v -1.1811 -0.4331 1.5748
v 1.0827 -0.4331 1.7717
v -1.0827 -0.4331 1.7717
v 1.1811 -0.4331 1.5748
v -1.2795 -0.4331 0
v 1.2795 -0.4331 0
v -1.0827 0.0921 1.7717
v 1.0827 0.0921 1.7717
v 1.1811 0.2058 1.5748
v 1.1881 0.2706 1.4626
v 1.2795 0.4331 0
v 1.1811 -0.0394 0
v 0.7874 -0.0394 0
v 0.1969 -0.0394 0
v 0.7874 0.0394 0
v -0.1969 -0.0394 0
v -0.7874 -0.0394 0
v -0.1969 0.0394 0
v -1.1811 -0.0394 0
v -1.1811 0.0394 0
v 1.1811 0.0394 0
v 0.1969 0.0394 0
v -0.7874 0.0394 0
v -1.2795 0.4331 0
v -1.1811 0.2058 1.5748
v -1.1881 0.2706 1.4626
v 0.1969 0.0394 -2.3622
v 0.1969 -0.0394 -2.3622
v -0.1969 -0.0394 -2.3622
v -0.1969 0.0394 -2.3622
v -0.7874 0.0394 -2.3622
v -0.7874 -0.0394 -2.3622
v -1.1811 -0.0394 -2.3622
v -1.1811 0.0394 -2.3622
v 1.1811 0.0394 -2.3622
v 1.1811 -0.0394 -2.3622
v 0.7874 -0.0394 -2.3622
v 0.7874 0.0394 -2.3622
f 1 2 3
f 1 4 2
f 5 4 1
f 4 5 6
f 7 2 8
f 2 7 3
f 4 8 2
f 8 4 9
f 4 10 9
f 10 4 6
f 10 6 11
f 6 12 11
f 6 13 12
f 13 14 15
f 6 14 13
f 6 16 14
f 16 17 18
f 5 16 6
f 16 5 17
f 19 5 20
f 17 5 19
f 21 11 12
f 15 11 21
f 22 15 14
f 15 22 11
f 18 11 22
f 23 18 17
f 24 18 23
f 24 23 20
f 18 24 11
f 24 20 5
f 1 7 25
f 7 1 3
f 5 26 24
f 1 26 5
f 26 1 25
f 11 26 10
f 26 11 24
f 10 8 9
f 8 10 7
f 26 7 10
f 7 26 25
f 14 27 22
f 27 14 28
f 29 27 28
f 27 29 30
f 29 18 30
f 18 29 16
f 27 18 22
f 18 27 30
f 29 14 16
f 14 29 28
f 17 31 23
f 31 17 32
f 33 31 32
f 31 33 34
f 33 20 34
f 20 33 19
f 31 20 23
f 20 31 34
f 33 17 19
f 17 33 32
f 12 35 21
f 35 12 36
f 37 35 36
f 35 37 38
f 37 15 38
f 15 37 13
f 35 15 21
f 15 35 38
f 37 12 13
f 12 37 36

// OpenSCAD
$fs = 0.1;

module pin() {
	w = 1;
	d = 0.2;
	h = 6;
	color("silver")
	translate([-w/2, -d/2, -h])
	cube([w, d, h]);
}

module transistor() {
	_inch = 1 / 2.54;
	w1 = 6.5;
	w2 = 6;
	w3 = 5.5;
	d1 = 2.2;
	d2 = 2;
	h = 4.5;
	h1 = 4;
	h2 = 4.5;
	scale([_inch, _inch, _inch]) {
		color("red")
		translate([0, d1/2, 0])
		difference() {
			rotate(a = 90, v = [1, 0, 0])
			linear_extrude(height = d1)
			polygon(points = [
				[-w1/2, 0], [-w2/2, h1], [-w3/2, h2], [w3/2, h2], [w2/2, h1], [w1/2, 0]
			]);

			rotate(a = 6.34, v = [1, 0, 0])
			translate([-w1/2, 0, 0])
			cube([w1, 1, h]);

			rotate(a = 30, v = [1, 0, 0])
			translate([-w1/2, -0.5+d2, 3])
			cube([w1, 1, h]);
		}
/*		difference() {
			translate([-w1/2, -d1/2, 0])
			cube([w1, d1, h]);

			translate([-w1/2-1, d1/2, 0])
			rotate(a = 6.34, v = [1, 0, 0])
			cube([w1+2, d1, h+1]);

			cube([w1, d1, h]);
		}*/
/*		polyhedron(points = [
			[-w1/2, -d1/2, 0], [-w1/2, d1/2, 0], [w1/2, d1/2, 0], [w1/2, -d1/2, 0],
			[-w2/2, -d1/2, h1], [w2/2, -d1/2, h1], [-w3/2, -d1/2, h2], [w3/2, -d1/2, h2]
		], faces = [
			[0, 1, 2], [0, 2, 3],
			[3, 0, 4], [3, 4, 6], [3, 6, 7], [3, 7, 5]
		]);*/
		pin();
		translate([-2.5, 0, 0]) pin();
		translate([2.5, 0, 0]) pin();
	}
}


transistor();
